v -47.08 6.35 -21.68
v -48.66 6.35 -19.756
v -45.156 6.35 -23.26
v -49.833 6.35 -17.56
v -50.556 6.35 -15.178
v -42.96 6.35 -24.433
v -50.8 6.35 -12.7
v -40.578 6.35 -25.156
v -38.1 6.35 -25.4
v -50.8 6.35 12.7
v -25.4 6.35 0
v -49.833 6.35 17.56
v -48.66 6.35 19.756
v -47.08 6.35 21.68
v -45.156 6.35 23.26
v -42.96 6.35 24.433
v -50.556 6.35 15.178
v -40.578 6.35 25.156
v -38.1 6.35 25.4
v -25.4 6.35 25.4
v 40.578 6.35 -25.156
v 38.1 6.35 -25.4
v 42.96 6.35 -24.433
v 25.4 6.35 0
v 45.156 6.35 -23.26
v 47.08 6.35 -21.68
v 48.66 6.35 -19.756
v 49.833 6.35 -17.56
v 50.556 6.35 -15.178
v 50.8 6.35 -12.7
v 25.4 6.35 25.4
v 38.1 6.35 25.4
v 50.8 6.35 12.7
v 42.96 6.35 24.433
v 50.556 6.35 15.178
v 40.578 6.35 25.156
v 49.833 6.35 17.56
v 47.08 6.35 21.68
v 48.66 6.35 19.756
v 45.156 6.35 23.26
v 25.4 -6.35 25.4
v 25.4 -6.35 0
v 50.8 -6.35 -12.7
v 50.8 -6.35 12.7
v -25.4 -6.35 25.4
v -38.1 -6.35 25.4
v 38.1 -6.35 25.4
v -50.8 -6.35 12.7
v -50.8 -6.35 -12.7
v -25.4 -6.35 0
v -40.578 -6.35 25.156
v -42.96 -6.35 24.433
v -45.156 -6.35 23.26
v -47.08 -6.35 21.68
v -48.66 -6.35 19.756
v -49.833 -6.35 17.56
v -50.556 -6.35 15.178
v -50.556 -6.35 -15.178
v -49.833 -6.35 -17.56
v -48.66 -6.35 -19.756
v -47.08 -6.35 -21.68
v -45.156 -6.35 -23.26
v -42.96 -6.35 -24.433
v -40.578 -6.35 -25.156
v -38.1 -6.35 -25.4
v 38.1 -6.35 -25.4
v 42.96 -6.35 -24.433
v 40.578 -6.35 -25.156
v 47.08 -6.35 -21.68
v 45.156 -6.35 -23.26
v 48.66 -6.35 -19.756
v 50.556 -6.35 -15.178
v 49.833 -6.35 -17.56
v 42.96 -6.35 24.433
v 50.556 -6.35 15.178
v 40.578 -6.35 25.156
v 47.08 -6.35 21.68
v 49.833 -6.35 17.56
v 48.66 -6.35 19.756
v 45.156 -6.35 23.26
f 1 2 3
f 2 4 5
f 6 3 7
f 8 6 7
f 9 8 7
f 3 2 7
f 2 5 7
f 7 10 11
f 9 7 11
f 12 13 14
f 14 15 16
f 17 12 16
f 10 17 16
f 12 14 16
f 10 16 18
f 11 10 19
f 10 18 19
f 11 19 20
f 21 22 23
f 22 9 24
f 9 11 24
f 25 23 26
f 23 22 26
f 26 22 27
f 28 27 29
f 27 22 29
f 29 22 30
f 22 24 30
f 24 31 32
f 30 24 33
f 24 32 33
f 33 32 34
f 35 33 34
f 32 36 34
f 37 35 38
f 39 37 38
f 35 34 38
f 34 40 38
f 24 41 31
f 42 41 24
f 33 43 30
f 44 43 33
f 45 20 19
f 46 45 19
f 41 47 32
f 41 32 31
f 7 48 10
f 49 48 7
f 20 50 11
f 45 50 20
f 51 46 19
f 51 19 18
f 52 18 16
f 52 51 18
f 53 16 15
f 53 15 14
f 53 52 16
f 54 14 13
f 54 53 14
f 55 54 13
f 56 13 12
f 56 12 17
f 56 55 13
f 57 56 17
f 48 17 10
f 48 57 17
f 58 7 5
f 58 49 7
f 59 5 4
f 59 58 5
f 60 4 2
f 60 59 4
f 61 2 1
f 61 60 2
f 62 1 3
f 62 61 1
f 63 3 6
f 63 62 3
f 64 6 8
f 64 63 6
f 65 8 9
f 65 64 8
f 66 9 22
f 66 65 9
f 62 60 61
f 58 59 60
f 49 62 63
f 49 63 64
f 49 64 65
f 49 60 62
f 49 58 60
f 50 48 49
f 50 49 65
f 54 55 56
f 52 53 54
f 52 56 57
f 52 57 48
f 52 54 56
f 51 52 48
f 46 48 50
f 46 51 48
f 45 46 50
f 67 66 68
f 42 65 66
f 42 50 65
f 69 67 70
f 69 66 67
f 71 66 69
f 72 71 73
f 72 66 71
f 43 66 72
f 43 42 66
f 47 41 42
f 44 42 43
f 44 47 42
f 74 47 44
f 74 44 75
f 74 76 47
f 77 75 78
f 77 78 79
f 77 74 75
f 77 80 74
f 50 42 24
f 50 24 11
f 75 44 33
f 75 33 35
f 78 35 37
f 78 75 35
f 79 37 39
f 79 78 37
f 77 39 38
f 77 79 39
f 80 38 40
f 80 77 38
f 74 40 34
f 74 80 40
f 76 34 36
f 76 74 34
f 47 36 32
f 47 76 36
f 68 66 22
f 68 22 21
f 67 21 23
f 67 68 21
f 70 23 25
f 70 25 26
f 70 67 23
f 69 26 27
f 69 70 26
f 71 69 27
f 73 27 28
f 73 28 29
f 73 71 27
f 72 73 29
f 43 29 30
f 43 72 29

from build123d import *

# Parameters (mm, degrees)
F1_DEPTH = 6.35


with BuildPart() as f1:
    # F0 (on Front) → F1 (new body, symmetric)
    with BuildSketch(Plane.XZ):
        with BuildLine():
            Line((-38.1, -25.4), (38.1, -25.4))
            ThreePointArc((38.1, -25.4), (47.0802561211, -21.6802561211), (50.8, -12.7))
            Line((50.8, -12.7), (50.8, 12.7))
            ThreePointArc((50.8, 12.7), (47.0802561211, 21.6802561211), (38.1, 25.4))
            Line((38.1, 25.4), (25.4, 25.4))
            Line((25.4, 25.4), (25.4, 0))
            Line((25.4, 0), (-25.4, 0))
            Line((-25.4, 0), (-25.4, 25.4))
            Line((-25.4, 25.4), (-38.1, 25.4))
            ThreePointArc((-38.1, 25.4), (-47.0802561211, 21.6802561211), (-50.8, 12.7))
            Line((-50.8, 12.7), (-50.8, -12.7))
            ThreePointArc((-50.8, -12.7), (-47.0802561211, -21.6802561211), (-38.1, -25.4))
        make_face()
    extrude(amount=F1_DEPTH, both=True)


solid = f1.part
